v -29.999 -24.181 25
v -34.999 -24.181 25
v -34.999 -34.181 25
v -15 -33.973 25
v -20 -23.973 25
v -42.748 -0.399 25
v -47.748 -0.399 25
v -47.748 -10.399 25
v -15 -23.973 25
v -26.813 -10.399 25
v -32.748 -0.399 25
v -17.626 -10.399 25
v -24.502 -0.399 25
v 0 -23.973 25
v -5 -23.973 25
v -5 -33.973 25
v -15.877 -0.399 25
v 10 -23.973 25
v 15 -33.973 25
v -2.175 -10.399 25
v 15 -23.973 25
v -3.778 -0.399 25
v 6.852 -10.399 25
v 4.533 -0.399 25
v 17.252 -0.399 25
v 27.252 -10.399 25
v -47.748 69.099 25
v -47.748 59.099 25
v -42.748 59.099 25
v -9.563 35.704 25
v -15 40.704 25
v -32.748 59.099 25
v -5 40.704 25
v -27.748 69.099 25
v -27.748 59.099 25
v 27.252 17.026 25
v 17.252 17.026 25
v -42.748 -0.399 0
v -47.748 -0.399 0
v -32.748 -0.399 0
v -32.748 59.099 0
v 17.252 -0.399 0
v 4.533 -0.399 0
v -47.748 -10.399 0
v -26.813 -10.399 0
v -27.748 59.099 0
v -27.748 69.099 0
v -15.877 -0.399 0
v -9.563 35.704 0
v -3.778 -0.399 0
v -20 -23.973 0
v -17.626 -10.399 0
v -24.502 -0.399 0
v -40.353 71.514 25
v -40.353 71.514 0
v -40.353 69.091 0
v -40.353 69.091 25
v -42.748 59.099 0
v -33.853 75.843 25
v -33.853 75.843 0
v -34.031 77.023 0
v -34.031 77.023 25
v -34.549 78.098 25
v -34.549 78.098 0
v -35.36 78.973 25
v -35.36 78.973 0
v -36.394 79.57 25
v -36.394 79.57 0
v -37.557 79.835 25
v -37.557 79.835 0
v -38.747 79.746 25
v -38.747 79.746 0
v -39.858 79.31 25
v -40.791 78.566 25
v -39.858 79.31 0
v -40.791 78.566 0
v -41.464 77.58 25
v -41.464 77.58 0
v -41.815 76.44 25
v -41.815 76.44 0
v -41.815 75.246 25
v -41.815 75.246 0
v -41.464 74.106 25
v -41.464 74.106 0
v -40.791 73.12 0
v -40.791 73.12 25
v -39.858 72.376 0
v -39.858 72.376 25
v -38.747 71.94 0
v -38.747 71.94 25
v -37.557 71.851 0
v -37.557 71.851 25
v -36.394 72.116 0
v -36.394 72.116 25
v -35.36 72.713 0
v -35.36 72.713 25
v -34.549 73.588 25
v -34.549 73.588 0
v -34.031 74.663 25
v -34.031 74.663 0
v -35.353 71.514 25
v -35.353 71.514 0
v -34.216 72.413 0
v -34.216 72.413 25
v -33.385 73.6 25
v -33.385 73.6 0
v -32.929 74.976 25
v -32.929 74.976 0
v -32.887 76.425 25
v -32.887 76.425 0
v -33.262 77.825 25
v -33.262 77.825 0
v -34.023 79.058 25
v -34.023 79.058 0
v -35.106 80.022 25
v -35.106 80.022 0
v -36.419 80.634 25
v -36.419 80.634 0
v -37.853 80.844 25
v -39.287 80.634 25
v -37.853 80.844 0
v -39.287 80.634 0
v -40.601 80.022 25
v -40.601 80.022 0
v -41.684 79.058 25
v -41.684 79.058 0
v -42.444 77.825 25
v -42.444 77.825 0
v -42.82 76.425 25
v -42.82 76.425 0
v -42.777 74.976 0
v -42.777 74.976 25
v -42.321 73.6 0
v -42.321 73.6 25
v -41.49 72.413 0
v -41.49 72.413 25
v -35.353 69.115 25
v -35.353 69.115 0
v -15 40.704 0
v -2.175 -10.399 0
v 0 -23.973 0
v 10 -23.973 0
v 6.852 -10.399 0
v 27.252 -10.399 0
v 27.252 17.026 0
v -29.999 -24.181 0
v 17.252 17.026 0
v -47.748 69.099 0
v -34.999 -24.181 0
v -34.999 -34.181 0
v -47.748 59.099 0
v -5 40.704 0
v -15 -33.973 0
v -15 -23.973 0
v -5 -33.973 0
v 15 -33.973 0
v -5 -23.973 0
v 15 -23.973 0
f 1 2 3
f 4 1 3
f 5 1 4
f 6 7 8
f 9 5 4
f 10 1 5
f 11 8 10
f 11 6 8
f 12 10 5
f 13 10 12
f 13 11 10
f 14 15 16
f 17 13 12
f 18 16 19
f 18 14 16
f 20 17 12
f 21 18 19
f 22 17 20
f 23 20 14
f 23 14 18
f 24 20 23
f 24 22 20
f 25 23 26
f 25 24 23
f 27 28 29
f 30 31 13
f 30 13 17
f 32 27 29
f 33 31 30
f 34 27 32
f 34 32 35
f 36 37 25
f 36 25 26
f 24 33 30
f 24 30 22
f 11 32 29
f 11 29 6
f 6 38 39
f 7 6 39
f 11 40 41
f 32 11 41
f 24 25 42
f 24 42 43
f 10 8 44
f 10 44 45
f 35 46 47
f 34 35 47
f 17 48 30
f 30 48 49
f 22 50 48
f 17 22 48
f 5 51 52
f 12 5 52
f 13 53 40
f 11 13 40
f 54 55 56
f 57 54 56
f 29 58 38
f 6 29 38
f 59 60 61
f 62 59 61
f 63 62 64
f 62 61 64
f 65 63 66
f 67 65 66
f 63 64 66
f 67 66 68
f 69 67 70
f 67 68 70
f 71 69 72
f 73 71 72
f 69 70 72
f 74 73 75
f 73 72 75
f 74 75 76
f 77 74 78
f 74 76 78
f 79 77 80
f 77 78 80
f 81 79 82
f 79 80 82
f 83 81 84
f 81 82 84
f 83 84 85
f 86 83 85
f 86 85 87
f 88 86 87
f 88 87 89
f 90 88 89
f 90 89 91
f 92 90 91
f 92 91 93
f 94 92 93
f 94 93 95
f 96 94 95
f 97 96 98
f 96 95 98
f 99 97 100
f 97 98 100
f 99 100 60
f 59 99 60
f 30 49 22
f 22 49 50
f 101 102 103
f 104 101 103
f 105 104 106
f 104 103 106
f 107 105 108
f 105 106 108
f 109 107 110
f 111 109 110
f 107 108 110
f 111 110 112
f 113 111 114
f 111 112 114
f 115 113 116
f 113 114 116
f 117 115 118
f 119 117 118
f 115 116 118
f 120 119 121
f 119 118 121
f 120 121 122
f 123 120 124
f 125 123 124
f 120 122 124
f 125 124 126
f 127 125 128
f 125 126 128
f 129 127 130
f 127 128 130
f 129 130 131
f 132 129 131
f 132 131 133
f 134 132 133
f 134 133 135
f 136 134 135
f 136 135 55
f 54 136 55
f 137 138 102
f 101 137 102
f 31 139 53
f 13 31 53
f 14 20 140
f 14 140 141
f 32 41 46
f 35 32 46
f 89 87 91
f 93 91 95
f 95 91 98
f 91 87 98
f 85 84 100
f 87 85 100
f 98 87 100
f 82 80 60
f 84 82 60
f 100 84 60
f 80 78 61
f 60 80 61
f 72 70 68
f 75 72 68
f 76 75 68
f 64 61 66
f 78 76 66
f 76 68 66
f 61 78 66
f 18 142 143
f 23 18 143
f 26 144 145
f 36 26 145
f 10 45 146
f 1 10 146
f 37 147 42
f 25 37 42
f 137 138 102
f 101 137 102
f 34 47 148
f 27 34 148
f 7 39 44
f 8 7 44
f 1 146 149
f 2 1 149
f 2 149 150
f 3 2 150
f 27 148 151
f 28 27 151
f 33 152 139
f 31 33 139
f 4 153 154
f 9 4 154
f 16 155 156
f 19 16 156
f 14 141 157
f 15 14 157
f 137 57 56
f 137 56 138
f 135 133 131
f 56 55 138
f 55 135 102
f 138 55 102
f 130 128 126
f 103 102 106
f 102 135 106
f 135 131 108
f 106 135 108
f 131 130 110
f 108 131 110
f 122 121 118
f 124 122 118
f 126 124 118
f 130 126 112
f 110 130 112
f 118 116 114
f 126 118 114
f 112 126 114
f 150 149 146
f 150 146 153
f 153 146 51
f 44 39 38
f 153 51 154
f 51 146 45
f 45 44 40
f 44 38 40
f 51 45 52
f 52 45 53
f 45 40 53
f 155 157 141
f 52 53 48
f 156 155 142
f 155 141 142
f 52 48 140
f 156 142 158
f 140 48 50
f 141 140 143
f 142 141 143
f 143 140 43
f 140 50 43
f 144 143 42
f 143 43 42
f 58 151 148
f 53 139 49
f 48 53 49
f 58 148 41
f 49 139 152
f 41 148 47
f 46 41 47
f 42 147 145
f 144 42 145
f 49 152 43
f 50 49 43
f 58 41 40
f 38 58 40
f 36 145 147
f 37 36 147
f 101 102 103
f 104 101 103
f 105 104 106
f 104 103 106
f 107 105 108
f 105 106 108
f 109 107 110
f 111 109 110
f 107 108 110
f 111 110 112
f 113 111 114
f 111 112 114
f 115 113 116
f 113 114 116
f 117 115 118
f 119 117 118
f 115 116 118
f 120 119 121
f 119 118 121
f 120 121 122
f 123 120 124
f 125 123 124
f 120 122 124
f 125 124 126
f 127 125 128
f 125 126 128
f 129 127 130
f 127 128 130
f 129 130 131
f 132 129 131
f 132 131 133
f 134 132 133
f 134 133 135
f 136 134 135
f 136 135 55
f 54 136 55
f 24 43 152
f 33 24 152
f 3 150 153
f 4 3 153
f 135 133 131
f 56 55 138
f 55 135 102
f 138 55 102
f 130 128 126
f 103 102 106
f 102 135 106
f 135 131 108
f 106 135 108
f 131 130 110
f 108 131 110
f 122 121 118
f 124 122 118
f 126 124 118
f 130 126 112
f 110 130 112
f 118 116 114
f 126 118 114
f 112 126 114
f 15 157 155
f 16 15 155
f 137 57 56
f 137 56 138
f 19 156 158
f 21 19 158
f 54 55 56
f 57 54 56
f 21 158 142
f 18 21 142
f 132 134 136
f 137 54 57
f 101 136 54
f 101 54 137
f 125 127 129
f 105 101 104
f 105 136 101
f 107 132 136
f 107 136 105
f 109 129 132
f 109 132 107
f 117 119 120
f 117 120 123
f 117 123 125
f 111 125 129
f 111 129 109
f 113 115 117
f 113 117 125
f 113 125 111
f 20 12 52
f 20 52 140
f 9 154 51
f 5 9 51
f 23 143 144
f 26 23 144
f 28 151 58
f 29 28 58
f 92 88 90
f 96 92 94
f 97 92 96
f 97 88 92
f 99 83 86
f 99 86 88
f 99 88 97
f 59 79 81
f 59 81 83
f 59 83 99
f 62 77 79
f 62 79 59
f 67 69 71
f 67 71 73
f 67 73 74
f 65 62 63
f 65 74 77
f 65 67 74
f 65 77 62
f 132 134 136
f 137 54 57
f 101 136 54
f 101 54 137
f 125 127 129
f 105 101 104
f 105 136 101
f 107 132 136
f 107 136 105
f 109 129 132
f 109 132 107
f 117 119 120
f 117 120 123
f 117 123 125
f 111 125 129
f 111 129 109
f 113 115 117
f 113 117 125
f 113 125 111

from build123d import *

# Parameters (mm, degrees)
F2_DEPTH = 25
F3_DEPTH = 25
F4_R     = 4.003487198
F5_DEPTH = 25


with BuildPart() as f2:
    # F0 (on Top) → F2 (new body)
    with BuildSketch(Plane.XY):
        Polygon((-27.7478177836, 69.0990370269), (-47.7478177836, 69.0990370269), (-47.7478177836, 59.0990370269), (-42.7478177836, 59.0990370269), (-42.7478177836, -0.3993871187), (-47.7478177836, -0.3993871187), (-47.7478177836, -10.3993871187), (-26.8132260698, -10.3993871187), (-24.5015927774, -0.3993871187), (-32.7478177836, -0.3993871187), (-32.7478177836, 59.0990370269), (-27.7478177836, 59.0990370269), align=None)
        Polygon((-15, 40.7039868832), (-24.5015927774, -0.3993871187), (-15.8771997512, -0.3993871187), (-9.5630353317, 35.7039868832), (-3.7775814806, -0.3993871187), (4.5327820422, -0.3993871187), (-5, 40.7039868832), align=None)
        Polygon((-15.8771997512, -0.3993871187), (-24.5015927774, -0.3993871187), (-26.8132260698, -10.3993871187), (-17.6261123097, -10.3993871187), align=None)
        Polygon((-3.7775814806, -0.3993871187), (-15.8771997512, -0.3993871187), (-17.6261123097, -10.3993871187), (-2.1751124563, -10.3993871187), align=None)
        Polygon((-17.6261123097, -10.3993871187), (-26.8132260698, -10.3993871187), (-29.9989221025, -24.180535033), (-34.9989221025, -24.180535033), (-34.9989221025, -34.180535033), (-15, -33.9728941465), (-15, -23.9728941465), (-20, -23.9728941465), align=None)
        Polygon((4.5327820422, -0.3993871187), (-3.7775814806, -0.3993871187), (-2.1751124563, -10.3993871187), (6.8520033407, -10.3993871187), align=None)
        Polygon((17.2521822164, -0.3993871187), (4.5327820422, -0.3993871187), (6.8520033407, -10.3993871187), (27.2521822164, -10.3993871187), (27.2521822164, 17.0264199791), (17.2521822164, 17.0264199791), align=None)
        Polygon((6.8520033407, -10.3993871187), (-2.1751124563, -10.3993871187), (0, -23.9728941465), (-5, -23.9728941465), (-5, -33.9728941465), (15, -33.9728941465), (15, -23.9728941465), (10, -23.9728941465), align=None)
    extrude(amount=F2_DEPTH)


with BuildPart() as f2b:
    # F1 (on Top) → F2, piece 2 (new body)
    with BuildSketch(Plane.XY):
        with BuildLine():
            Line((-40.3533168137, 71.514248848), (-40.3533168137, 69.090731442))
            Line((-40.3533168137, 69.090731442), (-35.3533168137, 69.115050137))
            Line((-35.3533168137, 69.115050137), (-35.3533168137, 71.514248848))
            ThreePointArc((-35.3533168137, 71.514248848), (-37.8533168137, 80.8443758669), (-40.3533168137, 71.514248848))
        make_face()
    extrude(amount=F2_DEPTH)


with BuildPart() as f3:
    # F1 (on Top) → F3 (new body)
    with BuildSketch(Plane.XY):
        with BuildLine():
            Line((-40.3533168137, 71.514248848), (-40.3533168137, 69.090731442))
            Line((-40.3533168137, 69.090731442), (-35.3533168137, 69.115050137))
            Line((-35.3533168137, 69.115050137), (-35.3533168137, 71.514248848))
            ThreePointArc((-35.3533168137, 71.514248848), (-37.8533168137, 80.8443758669), (-40.3533168137, 71.514248848))
        make_face()
    extrude(amount=F3_DEPTH)


with BuildPart() as f5:
    # F4 (on Top) → F5 (new body)
    with BuildSketch(Plane.XY):
        with Locations((-37.8565936583, 75.8431830385)):
            Circle(F4_R)
    extrude(amount=F5_DEPTH)


solid = Compound([f2.part, f2b.part, f3.part, f5.part])
